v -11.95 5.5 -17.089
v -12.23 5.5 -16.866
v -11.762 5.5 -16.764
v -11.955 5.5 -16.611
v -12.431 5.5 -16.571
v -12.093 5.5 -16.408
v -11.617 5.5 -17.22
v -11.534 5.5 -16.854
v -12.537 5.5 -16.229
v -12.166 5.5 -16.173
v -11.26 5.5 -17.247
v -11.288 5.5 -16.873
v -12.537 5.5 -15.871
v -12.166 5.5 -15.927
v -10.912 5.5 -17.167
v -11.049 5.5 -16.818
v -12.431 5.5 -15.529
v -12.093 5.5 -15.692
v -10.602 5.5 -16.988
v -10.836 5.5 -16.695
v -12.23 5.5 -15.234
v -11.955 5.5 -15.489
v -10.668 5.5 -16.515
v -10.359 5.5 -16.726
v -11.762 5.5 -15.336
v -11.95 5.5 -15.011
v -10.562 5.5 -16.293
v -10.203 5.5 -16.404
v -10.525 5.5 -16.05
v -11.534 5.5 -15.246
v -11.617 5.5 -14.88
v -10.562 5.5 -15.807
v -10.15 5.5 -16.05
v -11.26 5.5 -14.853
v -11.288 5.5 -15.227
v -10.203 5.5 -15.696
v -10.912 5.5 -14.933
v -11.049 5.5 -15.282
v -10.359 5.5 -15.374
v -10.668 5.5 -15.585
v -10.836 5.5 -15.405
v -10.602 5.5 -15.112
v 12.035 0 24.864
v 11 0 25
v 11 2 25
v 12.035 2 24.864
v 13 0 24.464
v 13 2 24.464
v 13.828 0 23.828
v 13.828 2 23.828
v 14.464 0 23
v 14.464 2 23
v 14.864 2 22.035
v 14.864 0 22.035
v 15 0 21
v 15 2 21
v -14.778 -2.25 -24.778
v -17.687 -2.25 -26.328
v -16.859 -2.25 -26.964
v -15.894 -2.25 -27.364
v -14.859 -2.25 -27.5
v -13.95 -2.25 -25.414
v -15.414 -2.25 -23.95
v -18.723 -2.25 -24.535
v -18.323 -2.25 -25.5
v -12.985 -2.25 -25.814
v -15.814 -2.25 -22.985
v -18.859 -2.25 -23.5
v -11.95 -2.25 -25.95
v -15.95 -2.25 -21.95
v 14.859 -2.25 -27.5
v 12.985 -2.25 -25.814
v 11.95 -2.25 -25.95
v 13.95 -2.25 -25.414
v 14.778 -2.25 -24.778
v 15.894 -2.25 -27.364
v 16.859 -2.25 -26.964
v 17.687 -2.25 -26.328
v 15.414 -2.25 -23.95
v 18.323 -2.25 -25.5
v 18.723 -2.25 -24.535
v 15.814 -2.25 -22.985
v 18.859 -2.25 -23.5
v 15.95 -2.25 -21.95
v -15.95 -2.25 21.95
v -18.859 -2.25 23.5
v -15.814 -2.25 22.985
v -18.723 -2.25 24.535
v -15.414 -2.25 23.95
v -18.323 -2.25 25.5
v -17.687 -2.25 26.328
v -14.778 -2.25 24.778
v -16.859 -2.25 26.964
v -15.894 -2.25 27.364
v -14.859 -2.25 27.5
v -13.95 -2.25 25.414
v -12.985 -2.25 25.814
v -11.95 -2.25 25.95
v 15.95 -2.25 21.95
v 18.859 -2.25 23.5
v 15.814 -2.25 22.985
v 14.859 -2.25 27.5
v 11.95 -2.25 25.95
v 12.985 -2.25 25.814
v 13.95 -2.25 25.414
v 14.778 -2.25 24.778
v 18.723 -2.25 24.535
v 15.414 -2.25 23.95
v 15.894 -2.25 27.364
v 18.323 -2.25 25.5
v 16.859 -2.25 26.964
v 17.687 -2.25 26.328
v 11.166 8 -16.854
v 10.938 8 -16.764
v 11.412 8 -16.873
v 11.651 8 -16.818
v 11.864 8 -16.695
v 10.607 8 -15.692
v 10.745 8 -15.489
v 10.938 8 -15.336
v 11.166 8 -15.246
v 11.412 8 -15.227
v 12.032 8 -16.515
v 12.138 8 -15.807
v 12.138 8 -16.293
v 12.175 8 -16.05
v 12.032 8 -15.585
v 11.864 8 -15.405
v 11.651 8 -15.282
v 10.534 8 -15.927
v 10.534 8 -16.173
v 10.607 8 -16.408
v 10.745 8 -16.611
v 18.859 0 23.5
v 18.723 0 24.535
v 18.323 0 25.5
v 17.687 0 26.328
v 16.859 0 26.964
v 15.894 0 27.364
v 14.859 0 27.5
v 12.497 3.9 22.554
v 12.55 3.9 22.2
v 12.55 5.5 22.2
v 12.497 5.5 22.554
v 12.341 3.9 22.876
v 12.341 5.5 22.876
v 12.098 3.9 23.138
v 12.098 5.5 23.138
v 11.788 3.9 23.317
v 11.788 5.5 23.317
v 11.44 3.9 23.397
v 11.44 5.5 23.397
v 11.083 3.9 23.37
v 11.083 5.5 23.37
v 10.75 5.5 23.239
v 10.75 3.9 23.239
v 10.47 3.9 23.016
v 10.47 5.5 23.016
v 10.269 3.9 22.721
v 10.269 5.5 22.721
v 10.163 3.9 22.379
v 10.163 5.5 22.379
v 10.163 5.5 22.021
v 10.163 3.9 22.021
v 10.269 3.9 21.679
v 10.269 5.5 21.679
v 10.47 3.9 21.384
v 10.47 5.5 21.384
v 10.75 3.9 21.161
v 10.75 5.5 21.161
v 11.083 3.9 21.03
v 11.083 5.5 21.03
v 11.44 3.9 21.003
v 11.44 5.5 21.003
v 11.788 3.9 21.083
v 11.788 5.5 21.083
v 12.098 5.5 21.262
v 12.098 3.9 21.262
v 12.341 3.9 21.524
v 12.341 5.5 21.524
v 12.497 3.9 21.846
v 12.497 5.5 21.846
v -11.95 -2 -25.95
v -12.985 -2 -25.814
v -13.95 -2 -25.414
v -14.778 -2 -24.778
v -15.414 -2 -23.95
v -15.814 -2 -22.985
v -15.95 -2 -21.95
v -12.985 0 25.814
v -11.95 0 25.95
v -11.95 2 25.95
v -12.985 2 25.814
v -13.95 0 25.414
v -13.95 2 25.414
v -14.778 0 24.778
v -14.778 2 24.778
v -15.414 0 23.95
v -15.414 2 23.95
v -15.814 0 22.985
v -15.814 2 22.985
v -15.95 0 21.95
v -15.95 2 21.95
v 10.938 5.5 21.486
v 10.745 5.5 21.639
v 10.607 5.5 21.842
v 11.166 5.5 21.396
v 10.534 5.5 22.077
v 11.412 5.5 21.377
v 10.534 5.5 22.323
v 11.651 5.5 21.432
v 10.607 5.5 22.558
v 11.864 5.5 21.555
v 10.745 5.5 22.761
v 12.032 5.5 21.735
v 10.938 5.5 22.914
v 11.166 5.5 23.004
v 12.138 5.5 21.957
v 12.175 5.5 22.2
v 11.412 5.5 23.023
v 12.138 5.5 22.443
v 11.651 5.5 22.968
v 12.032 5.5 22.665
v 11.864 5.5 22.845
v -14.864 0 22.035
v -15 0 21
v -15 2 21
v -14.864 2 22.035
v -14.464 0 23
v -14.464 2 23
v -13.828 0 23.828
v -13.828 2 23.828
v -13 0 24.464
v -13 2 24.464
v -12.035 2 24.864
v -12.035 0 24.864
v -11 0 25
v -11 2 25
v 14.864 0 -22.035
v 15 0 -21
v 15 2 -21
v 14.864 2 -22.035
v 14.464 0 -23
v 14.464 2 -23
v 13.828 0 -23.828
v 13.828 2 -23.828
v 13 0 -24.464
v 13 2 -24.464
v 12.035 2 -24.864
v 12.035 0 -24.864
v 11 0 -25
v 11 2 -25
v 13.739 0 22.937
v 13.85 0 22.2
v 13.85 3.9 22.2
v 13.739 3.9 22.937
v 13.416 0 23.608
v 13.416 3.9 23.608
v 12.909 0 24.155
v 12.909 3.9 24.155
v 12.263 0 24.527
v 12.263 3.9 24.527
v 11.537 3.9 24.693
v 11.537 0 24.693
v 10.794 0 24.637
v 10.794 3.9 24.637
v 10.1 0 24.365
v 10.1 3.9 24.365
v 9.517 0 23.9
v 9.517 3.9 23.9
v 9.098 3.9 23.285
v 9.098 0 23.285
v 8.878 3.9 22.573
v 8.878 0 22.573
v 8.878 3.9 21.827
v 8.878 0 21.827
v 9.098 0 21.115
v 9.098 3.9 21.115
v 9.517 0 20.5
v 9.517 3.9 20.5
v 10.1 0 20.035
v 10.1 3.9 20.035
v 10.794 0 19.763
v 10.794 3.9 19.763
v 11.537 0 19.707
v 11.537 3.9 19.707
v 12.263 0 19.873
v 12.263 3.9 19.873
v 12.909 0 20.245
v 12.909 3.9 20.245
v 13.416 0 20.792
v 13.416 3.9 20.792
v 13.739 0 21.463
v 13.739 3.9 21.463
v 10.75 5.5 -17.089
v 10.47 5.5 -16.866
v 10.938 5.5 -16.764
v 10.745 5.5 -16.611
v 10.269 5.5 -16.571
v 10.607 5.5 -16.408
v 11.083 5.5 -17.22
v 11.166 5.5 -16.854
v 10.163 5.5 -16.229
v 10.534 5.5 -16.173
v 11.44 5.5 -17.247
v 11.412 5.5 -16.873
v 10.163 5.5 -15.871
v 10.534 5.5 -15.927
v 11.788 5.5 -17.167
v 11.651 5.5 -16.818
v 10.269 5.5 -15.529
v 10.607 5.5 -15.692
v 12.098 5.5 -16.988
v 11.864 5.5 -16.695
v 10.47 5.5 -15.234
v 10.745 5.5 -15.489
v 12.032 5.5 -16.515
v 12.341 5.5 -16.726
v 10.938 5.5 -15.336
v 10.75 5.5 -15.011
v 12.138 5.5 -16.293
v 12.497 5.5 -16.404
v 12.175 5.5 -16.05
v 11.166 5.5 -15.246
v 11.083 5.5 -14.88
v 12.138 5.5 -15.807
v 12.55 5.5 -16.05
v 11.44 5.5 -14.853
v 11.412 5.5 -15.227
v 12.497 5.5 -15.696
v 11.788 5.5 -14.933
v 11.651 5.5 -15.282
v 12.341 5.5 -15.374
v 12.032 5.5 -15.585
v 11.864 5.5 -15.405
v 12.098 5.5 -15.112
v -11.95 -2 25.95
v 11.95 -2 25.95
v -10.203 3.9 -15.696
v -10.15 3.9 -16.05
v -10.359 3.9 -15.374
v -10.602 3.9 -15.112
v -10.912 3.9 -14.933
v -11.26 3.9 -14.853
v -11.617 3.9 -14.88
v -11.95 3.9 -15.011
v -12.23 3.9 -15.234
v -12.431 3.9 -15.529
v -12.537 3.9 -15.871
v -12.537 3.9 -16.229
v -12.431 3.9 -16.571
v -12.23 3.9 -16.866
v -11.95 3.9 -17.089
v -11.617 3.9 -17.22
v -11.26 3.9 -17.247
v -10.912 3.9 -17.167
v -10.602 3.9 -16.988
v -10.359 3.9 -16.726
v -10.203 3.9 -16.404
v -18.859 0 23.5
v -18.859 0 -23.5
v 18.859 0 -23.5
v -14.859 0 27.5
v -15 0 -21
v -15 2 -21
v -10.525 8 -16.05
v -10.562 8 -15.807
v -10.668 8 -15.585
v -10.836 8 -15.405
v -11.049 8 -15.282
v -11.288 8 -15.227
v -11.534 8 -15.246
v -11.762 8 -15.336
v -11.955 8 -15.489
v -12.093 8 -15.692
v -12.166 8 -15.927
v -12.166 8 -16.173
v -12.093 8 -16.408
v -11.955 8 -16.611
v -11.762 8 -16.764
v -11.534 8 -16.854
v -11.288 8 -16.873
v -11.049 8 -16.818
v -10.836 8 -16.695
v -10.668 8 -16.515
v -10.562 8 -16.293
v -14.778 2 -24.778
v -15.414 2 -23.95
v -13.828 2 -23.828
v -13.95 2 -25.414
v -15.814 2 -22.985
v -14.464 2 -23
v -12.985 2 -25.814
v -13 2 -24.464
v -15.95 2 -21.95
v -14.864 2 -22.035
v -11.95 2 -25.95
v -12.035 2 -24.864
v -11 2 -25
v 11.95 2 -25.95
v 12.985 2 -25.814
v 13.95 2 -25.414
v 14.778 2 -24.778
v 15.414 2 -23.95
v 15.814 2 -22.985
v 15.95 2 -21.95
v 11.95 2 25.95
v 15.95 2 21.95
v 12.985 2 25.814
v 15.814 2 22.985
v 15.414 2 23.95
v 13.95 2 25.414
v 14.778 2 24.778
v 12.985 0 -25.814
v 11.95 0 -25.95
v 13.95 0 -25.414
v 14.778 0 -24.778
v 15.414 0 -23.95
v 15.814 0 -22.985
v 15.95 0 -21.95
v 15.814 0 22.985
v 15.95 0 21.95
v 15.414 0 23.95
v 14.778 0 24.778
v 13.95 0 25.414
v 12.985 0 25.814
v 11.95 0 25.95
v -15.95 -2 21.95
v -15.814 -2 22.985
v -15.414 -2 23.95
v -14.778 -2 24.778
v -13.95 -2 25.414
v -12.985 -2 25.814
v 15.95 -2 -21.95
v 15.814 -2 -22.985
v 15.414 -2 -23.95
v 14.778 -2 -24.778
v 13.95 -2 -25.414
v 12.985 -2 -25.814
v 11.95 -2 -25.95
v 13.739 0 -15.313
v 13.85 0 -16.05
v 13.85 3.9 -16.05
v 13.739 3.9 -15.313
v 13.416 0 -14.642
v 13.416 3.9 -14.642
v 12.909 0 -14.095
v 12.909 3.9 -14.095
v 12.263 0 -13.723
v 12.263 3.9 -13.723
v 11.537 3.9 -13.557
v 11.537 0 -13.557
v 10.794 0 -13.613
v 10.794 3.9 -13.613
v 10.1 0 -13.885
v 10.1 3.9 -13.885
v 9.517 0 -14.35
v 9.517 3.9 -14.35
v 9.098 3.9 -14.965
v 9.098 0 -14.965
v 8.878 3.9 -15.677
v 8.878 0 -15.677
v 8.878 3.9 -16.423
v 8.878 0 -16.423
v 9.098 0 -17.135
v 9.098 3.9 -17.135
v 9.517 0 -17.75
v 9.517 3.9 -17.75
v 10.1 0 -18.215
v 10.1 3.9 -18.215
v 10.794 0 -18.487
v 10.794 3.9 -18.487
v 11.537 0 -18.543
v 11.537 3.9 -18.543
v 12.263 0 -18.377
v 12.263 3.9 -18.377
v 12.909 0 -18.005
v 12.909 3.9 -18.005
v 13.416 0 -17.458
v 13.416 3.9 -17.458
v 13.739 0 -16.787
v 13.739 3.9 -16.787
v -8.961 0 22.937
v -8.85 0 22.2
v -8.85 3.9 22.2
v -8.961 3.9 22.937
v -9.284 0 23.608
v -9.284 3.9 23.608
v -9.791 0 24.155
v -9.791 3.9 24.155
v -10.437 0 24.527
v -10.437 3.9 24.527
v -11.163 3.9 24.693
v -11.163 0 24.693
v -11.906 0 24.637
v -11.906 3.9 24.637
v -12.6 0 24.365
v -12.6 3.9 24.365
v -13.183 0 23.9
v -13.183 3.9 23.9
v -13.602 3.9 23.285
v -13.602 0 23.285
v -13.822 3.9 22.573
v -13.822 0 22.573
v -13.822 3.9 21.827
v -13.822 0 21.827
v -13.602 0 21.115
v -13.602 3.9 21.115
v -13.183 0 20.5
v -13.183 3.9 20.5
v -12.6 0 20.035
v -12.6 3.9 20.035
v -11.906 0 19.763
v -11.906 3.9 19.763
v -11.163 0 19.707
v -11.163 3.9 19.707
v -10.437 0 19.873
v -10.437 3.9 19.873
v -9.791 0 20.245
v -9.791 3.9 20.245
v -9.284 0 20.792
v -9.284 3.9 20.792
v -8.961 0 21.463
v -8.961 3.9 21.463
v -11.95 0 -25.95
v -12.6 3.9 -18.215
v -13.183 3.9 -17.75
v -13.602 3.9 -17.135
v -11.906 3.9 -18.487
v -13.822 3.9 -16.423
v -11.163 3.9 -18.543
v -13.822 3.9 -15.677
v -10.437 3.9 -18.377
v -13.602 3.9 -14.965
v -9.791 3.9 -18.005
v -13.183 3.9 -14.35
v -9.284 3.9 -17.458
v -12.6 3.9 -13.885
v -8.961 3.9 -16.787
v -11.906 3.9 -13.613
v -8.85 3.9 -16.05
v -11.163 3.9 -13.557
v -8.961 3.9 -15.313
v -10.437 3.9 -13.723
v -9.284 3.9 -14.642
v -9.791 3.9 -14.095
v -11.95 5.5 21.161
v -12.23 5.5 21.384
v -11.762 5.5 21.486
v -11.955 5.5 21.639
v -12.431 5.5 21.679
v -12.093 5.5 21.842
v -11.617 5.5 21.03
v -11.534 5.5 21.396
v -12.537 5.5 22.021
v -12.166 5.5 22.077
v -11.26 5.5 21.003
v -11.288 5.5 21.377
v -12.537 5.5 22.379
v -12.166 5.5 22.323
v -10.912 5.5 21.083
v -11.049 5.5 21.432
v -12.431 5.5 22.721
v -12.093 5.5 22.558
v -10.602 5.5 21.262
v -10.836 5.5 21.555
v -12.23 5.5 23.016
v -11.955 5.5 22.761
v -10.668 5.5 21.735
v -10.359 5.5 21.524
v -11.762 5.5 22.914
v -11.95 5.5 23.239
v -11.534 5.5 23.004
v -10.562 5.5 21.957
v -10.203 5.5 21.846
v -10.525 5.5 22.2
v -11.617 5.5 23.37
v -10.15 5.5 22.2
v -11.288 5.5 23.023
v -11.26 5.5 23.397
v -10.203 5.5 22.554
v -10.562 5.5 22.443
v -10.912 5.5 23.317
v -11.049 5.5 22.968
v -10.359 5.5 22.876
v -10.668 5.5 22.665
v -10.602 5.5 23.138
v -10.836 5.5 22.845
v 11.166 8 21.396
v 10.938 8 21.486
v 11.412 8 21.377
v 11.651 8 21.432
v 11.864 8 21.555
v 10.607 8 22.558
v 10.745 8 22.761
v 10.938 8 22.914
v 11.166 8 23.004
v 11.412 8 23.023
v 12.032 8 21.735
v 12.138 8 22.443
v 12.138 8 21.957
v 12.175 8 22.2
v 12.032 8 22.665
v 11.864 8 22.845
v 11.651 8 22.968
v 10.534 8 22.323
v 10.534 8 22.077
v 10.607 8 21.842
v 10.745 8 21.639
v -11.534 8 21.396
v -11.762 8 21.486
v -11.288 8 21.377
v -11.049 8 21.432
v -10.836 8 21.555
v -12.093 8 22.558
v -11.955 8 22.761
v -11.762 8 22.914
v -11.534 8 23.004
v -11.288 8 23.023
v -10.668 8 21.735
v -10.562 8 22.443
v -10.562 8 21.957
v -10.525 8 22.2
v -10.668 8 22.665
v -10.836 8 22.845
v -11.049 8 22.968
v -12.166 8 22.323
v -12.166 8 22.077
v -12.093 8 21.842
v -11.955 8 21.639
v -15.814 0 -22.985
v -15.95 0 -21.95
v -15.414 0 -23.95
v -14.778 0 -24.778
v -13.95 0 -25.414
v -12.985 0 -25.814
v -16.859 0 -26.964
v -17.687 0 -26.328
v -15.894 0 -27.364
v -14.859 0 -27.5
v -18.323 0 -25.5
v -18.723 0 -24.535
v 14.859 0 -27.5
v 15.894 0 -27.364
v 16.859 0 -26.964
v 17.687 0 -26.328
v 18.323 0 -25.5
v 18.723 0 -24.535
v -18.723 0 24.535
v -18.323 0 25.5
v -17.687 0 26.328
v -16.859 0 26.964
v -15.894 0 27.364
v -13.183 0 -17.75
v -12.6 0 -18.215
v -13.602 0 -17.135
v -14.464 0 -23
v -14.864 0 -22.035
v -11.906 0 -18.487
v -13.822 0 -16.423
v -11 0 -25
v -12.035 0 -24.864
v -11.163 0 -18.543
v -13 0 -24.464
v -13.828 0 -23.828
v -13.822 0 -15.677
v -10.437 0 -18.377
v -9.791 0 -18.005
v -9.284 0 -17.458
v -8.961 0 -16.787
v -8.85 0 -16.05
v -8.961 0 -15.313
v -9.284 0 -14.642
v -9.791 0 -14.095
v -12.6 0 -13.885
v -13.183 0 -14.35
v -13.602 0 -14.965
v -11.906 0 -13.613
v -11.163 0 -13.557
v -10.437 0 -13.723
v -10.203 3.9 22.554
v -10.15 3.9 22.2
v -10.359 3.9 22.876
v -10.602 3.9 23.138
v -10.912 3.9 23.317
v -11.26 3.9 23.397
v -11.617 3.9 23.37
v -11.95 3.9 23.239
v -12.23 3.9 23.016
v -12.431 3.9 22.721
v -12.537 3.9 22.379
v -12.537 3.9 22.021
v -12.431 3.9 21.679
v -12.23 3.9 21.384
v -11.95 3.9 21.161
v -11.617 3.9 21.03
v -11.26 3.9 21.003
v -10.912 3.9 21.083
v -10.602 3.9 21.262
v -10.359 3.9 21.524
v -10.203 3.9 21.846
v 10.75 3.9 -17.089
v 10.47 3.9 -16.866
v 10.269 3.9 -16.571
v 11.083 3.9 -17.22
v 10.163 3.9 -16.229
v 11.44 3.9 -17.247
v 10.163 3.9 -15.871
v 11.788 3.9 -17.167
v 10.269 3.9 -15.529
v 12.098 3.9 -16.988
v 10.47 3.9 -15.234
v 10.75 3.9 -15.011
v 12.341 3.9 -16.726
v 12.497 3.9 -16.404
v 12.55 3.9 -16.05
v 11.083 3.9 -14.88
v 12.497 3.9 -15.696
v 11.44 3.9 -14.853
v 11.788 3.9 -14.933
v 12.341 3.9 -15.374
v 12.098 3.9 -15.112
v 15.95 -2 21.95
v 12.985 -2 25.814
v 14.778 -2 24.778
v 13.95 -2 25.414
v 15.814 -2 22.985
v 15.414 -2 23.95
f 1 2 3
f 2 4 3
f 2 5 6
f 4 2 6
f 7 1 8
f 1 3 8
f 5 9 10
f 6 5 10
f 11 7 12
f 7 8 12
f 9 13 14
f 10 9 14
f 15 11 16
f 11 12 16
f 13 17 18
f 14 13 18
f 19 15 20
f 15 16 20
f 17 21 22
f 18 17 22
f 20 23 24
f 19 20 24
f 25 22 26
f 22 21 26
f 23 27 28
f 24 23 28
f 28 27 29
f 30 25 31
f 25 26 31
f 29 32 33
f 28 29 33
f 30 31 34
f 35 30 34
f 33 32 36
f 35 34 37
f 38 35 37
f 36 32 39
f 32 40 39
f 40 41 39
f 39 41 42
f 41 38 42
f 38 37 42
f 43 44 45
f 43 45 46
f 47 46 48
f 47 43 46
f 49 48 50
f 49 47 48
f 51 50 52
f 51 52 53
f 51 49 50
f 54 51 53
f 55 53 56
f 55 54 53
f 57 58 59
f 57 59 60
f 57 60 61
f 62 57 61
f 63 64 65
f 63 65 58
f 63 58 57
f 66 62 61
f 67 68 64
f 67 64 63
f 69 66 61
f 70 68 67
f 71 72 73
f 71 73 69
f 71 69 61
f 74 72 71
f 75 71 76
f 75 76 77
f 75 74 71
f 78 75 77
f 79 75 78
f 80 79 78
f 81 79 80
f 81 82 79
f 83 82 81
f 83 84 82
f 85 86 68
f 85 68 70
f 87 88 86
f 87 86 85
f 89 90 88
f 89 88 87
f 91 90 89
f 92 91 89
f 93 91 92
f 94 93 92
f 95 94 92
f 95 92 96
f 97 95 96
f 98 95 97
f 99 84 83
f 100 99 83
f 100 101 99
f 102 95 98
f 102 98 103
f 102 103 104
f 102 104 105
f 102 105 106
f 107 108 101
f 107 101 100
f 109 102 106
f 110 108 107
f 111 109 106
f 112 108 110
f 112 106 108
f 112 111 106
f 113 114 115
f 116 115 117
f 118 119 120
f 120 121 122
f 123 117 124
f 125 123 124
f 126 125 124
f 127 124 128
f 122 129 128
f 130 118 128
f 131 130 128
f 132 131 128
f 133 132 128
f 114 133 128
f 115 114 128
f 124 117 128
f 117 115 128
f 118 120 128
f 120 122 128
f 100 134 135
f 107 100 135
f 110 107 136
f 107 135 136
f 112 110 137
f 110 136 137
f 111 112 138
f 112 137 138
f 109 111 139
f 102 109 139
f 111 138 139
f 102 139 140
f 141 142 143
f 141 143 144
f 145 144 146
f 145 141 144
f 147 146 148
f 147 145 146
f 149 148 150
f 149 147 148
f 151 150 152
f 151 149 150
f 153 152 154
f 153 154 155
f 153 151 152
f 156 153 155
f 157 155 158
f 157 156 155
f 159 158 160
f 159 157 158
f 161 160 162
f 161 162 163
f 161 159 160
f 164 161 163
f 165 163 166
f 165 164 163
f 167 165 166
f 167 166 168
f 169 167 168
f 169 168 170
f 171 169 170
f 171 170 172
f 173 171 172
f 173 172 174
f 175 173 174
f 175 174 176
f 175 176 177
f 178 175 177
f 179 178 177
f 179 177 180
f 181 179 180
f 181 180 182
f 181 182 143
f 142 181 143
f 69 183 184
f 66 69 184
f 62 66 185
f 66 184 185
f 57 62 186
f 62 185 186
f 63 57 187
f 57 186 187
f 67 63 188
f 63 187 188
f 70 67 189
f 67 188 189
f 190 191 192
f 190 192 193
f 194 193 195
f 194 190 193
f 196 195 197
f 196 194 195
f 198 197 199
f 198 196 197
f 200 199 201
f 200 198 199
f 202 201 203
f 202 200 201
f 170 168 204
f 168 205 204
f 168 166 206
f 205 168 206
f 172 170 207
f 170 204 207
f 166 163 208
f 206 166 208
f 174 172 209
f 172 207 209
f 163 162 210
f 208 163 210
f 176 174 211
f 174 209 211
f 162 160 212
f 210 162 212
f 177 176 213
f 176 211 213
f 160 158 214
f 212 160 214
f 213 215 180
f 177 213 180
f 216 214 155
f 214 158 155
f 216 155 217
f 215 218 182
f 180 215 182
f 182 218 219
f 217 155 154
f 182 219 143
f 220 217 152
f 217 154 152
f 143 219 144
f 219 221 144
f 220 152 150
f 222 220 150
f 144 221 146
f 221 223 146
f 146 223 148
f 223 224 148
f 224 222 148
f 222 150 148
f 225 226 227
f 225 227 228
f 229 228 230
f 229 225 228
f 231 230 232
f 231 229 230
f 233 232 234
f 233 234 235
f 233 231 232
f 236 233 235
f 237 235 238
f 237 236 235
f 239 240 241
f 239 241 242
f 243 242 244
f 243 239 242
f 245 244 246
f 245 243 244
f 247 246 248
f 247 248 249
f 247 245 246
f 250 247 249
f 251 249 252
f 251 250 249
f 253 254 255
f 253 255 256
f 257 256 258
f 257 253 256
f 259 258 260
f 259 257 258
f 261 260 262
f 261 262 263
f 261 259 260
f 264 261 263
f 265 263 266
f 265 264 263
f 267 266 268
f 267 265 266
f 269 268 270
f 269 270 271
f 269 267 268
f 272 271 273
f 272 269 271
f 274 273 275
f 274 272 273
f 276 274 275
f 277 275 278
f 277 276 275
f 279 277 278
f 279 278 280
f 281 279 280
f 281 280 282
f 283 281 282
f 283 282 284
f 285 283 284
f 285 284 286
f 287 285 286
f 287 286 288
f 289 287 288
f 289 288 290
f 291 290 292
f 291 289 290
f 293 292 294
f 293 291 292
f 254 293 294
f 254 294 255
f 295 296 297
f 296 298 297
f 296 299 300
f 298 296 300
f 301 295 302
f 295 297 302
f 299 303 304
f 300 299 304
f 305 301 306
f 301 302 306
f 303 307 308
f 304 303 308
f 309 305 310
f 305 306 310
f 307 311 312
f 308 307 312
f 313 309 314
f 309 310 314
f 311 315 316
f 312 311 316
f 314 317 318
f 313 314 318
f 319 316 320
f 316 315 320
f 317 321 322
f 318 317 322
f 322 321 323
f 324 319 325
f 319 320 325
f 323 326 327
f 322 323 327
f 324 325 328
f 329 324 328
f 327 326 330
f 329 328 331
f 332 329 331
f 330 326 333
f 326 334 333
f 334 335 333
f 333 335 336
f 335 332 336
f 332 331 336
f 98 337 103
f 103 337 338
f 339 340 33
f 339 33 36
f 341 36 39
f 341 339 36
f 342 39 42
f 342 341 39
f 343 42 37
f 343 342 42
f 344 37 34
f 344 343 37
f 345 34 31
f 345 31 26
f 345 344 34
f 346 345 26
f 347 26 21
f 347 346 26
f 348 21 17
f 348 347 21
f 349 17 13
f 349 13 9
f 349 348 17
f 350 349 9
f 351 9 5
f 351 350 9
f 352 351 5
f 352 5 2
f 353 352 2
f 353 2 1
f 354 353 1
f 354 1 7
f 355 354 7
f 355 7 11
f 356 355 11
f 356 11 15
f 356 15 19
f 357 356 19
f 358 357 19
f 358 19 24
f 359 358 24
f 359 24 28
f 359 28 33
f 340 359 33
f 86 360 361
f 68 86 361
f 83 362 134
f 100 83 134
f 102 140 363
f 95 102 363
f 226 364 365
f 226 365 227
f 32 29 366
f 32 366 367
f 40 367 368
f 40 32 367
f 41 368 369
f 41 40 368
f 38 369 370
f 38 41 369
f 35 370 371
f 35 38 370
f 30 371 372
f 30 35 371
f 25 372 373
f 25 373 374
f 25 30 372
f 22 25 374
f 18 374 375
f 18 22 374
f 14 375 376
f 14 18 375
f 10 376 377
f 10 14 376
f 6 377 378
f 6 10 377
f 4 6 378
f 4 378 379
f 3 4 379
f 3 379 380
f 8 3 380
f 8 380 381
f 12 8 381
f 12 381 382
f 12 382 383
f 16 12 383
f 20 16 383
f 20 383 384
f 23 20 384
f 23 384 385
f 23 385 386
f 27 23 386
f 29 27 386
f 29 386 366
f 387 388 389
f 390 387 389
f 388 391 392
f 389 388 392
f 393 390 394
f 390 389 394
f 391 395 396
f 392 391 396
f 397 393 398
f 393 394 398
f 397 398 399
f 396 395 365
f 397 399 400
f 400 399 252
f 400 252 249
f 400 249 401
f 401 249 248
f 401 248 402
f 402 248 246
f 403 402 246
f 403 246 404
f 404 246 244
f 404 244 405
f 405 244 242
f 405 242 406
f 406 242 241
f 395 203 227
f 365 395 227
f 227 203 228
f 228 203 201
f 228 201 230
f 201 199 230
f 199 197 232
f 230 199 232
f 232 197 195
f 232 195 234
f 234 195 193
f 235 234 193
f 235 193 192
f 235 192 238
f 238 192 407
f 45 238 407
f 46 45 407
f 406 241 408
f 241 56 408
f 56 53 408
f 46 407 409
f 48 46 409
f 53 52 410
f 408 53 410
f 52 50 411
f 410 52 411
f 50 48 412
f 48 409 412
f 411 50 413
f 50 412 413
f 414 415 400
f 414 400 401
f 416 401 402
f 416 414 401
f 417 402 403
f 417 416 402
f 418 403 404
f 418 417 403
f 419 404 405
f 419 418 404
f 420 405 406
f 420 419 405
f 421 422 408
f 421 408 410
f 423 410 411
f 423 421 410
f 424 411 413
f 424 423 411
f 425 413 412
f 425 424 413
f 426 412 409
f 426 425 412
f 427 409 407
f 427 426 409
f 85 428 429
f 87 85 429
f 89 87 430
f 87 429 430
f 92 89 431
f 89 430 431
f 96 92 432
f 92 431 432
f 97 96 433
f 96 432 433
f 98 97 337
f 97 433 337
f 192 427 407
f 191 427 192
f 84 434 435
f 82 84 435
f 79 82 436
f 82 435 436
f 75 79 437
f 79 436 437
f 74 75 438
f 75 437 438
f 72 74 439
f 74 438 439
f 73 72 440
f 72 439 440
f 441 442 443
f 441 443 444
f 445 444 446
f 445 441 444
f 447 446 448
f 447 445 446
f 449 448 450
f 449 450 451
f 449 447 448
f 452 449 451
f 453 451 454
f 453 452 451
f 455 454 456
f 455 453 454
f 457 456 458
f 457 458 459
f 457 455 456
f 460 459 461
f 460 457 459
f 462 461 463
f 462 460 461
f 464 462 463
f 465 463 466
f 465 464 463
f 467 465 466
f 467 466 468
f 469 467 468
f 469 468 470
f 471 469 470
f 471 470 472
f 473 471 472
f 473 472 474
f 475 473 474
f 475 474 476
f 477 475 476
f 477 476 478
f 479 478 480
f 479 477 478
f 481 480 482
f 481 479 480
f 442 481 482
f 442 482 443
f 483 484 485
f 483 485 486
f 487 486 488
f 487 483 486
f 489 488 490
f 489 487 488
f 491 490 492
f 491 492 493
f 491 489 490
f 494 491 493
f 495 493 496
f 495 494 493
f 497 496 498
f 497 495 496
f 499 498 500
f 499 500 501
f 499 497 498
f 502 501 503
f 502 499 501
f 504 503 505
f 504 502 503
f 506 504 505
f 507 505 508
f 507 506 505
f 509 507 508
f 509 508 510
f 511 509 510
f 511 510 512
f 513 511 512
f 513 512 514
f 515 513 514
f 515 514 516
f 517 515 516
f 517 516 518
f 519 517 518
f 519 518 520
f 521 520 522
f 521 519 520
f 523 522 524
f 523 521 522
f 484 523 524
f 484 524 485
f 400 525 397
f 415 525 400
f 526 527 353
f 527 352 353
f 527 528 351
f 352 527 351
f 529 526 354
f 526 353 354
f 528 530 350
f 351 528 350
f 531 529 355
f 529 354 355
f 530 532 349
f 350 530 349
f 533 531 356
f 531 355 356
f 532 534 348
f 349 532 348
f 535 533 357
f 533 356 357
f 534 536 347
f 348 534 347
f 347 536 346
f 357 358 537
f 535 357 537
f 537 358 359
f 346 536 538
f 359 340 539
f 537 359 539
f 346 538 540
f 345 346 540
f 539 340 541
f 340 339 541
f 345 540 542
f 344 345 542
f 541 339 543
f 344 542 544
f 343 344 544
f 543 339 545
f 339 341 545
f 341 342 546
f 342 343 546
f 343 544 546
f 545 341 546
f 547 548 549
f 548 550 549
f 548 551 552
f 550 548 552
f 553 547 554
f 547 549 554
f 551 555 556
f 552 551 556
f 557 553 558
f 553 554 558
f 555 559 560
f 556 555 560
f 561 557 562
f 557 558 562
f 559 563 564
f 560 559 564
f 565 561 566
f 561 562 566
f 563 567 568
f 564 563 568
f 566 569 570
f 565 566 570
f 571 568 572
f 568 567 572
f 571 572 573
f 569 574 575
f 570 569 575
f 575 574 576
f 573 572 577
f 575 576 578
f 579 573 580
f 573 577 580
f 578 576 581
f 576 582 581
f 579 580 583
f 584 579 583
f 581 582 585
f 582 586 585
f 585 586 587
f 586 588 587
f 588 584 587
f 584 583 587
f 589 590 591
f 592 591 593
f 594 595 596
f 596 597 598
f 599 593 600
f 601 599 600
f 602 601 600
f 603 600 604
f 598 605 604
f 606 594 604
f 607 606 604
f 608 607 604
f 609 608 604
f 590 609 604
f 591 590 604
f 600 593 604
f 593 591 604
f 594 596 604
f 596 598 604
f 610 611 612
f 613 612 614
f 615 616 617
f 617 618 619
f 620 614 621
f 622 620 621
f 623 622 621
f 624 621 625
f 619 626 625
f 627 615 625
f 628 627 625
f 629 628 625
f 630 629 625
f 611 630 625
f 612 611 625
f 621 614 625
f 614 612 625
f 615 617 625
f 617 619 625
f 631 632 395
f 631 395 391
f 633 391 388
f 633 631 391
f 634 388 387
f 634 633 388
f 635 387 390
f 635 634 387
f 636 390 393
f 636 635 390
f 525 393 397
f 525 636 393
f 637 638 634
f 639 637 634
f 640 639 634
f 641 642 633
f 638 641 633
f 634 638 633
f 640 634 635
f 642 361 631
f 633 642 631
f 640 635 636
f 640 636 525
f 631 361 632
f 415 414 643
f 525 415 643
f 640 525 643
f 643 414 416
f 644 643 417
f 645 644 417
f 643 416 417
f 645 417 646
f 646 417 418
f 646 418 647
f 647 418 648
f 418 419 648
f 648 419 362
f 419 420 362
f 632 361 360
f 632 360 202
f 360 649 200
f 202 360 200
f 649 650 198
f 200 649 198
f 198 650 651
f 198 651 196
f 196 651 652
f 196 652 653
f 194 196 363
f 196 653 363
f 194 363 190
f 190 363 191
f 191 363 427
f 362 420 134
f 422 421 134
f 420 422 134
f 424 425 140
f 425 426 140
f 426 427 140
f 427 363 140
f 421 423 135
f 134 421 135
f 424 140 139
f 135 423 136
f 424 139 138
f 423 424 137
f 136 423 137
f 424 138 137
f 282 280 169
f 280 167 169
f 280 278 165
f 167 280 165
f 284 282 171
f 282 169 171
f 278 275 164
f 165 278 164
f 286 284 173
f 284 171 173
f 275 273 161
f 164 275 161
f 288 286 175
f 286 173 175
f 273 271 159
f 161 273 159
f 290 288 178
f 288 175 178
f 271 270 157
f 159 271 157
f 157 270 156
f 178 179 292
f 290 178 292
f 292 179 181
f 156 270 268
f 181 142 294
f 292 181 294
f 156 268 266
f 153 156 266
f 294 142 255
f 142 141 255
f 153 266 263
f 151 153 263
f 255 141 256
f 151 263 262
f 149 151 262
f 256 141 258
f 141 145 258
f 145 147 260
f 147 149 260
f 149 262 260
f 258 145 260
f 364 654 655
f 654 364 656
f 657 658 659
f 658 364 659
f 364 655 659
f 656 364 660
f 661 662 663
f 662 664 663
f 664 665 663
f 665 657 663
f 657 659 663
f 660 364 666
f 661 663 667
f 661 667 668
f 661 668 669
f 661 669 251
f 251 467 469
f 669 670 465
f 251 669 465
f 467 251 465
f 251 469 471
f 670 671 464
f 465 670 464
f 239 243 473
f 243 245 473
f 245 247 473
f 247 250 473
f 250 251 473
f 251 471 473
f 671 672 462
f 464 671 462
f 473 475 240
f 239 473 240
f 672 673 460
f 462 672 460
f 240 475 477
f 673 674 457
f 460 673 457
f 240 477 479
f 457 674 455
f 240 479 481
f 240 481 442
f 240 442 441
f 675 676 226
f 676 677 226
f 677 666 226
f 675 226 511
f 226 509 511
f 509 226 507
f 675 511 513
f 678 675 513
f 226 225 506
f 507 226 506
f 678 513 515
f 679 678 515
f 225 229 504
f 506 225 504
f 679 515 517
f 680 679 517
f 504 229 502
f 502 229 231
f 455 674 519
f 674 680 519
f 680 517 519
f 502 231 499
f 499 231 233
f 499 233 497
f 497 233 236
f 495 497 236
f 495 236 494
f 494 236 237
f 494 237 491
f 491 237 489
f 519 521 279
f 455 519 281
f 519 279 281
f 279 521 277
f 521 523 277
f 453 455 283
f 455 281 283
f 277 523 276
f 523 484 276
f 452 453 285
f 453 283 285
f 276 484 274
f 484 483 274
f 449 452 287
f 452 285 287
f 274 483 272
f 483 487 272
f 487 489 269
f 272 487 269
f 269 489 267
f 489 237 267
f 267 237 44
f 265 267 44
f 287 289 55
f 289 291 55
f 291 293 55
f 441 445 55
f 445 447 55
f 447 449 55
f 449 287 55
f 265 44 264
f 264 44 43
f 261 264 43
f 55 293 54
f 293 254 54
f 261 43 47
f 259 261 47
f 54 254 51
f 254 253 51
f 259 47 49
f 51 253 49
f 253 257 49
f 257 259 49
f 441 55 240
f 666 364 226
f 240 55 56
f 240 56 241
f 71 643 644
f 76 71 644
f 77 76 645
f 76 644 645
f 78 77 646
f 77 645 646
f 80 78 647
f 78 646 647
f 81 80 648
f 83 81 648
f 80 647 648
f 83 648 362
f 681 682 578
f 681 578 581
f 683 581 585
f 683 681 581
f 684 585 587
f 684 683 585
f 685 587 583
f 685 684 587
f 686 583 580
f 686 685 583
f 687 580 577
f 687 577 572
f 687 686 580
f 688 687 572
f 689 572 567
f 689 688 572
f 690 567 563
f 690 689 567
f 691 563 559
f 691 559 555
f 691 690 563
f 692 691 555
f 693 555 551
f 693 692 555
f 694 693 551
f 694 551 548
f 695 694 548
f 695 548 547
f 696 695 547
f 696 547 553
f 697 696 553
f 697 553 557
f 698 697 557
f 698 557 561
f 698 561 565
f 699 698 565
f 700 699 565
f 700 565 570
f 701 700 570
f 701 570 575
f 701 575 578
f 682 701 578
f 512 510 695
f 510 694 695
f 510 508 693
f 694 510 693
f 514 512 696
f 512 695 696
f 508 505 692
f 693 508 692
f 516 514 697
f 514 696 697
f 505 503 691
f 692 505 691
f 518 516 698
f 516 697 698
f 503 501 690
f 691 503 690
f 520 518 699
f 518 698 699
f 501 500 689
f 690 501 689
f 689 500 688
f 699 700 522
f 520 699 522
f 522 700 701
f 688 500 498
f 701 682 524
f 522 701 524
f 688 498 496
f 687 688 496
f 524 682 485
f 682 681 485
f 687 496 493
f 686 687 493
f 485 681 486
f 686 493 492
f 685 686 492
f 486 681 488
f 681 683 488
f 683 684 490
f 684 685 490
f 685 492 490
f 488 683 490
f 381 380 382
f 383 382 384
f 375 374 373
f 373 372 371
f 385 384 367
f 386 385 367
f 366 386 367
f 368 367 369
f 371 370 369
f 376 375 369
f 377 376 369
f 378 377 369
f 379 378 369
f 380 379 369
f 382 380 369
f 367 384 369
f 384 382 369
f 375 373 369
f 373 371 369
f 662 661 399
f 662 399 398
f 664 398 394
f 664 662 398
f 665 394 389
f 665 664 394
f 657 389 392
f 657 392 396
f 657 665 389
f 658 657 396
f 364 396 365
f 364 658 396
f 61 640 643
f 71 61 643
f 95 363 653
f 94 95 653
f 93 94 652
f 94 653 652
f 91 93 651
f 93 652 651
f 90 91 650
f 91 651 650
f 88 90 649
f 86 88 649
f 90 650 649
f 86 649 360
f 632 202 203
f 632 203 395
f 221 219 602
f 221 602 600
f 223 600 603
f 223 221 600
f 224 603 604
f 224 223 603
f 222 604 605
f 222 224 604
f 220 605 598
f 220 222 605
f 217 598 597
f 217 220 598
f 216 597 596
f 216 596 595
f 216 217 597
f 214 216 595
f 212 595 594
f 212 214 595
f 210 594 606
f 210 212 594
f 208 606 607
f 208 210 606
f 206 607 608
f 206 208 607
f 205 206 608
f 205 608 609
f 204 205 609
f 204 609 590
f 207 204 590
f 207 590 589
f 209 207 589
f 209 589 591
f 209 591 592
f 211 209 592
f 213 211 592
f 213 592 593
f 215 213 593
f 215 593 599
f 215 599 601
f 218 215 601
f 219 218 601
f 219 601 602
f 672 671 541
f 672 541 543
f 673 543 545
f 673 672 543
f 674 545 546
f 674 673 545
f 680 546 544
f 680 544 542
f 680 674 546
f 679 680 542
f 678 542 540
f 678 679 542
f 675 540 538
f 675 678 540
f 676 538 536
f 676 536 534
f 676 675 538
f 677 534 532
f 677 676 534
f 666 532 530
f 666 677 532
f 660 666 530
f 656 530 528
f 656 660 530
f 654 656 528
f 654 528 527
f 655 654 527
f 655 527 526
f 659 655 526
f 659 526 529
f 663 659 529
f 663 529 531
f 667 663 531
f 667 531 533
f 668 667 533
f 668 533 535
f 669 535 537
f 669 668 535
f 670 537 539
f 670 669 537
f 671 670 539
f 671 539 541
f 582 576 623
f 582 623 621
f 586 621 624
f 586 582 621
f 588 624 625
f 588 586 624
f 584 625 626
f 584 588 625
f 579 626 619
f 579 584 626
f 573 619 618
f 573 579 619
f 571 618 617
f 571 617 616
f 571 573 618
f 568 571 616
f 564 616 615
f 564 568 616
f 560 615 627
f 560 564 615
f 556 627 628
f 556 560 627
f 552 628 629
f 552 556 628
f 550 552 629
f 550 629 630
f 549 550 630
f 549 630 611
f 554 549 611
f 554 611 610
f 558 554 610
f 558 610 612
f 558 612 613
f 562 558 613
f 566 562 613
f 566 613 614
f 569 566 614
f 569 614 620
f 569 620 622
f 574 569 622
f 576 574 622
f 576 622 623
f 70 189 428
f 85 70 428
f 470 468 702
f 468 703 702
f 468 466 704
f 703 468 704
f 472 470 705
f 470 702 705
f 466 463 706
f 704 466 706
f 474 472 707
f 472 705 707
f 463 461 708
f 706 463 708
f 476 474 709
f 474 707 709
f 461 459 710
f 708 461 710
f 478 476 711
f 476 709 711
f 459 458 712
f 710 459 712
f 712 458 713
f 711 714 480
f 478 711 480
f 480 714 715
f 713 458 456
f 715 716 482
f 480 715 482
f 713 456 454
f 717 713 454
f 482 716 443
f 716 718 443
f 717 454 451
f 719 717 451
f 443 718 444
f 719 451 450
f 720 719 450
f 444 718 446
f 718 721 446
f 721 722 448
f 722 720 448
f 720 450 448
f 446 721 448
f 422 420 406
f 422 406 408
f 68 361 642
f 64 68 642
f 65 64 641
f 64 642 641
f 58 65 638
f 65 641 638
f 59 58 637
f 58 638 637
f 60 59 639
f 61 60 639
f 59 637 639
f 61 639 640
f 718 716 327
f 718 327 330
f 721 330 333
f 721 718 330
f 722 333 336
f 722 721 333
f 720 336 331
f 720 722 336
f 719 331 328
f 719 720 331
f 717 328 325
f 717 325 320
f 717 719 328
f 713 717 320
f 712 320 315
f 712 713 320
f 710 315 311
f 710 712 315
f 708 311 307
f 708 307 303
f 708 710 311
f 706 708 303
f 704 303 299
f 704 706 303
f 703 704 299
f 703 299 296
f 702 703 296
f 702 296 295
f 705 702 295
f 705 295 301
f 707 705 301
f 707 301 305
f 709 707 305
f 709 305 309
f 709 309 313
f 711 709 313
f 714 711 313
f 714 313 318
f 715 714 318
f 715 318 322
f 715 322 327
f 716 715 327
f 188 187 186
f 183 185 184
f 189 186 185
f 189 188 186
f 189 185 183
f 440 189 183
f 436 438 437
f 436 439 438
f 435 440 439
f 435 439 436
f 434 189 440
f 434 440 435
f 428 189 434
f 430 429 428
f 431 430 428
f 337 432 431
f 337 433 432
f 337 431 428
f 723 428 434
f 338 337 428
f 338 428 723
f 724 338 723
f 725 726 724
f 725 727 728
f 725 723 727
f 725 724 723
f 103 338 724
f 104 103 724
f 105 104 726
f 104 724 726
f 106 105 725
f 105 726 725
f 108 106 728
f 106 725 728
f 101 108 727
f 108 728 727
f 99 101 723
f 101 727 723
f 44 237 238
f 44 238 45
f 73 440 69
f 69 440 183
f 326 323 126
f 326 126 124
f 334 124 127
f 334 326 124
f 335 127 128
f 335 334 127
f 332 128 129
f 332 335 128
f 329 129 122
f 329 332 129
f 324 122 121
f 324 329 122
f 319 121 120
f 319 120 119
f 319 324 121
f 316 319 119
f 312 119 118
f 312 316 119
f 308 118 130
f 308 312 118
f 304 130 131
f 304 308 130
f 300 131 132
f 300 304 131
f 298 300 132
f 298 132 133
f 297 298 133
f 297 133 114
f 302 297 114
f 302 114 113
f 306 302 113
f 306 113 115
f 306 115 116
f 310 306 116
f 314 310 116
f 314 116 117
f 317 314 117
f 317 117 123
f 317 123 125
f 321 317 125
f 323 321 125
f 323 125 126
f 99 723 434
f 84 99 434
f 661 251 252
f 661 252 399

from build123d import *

# Parameters (mm, degrees)
F0_R     = 2.5
F0_W     = 0.95
F0_H     = 30
F0_R_2   = 1.2
F0_R_3   = 0.825
F1_DEPTH = 2
F2_DEPTH = 2
F3_DEPTH = 2.25
F4_DEPTH = 8
F5_DEPTH = 5.5
F6_DEPTH = 3.9


# Not quite as in the source:
# - a feature names something its author has since deleted; it is built from what else it names


with BuildPart() as f1:
    # F0 (on Front) → F1 (new body)
    with BuildSketch(Plane.XZ):
        with BuildLine():
            Line((0, 25), (0, -25))
            Line((0, -25), (11, -25))
            ThreePointArc((11, -25), (13.8284271247, -23.8284271247), (15, -21))
            Line((15, -21), (15, -15))
            Line((15, -15), (15, 15))
            Line((15, 15), (15, 21))
            ThreePointArc((15, 21), (13.8284271247, 23.8284271247), (11, 25))
            Line((11, 25), (0, 25))
        make_face()
        with Locations((11.35, -16.05)):
            Circle(F0_R, mode=Mode.SUBTRACT)
        with Locations((11.35, 22.2)):
            Circle(F0_R, mode=Mode.SUBTRACT)
        with BuildLine():
            Line((-11, -25), (0, -25))
            Line((0, -25), (0, 25))
            Line((0, 25), (-11, 25))
            ThreePointArc((-11, 25), (-13.8284271247, 23.8284271247), (-15, 21))
            Line((-15, 21), (-15, 15))
            Line((-15, 15), (-15, -15))
            Line((-15, -15), (-15, -21))
            ThreePointArc((-15, -21), (-13.8284271247, -23.8284271247), (-11, -25))
        make_face()
        with Locations((-11.35, -16.05)):
            Circle(F0_R, mode=Mode.SUBTRACT)
        with Locations((-11.35, 22.2)):
            Circle(F0_R, mode=Mode.SUBTRACT)
        with BuildLine():
            Line((0, -27.5), (0, -25.95))
            Line((0, -25.95), (-11.95, -25.95))
            ThreePointArc((-11.95, -25.95), (-14.7784271247, -24.7784271247), (-15.95, -21.95))
            Line((-15.95, -21.95), (-15.95, -15))
            Line((-15.95, -15), (-15.95, 15))
            Line((-15.95, 15), (-15.95, 21.95))
            ThreePointArc((-15.95, 21.95), (-14.7784271247, 24.7784271247), (-11.95, 25.95))
            Line((-11.95, 25.95), (0, 25.95))
            Line((0, 25.95), (0, 27.5))
            Line((0, 27.5), (-14.8588332385, 27.5))
            ThreePointArc((-14.8588332385, 27.5), (-17.6872603632, 26.3284271247), (-18.8588332385, 23.5))
            Line((-18.8588332385, 23.5), (-18.8588332385, -23.5))
            ThreePointArc((-18.8588332385, -23.5), (-17.6872603632, -26.3284271247), (-14.8588332385, -27.5))
            Line((-14.8588332385, -27.5), (0, -27.5))
        make_face()
        with BuildLine():
            ThreePointArc((15.95, -21.95), (14.7784271247, -24.7784271247), (11.95, -25.95))
            Line((11.95, -25.95), (0, -25.95))
            Line((0, -25.95), (0, -27.5))
            Line((0, -27.5), (14.8588332385, -27.5))
            ThreePointArc((14.8588332385, -27.5), (17.6872603632, -26.3284271247), (18.8588332385, -23.5))
            Line((18.8588332385, -23.5), (18.8588332385, 23.5))
            ThreePointArc((18.8588332385, 23.5), (17.6872603632, 26.3284271247), (14.8588332385, 27.5))
            Line((14.8588332385, 27.5), (0, 27.5))
            Line((0, 27.5), (0, 25.95))
            Line((0, 25.95), (11.95, 25.95))
            ThreePointArc((11.95, 25.95), (14.7784271247, 24.7784271247), (15.95, 21.95))
            Line((15.95, 21.95), (15.95, 15))
            Line((15.95, 15), (15.95, -15))
            Line((15.95, -15), (15.95, -21.95))
        make_face()
        with Locations((15.475, 0)):
            Rectangle(F0_W, F0_H)
        with Locations((-15.475, 0)):
            Rectangle(F0_W, F0_H)
        with BuildLine():
            Line((-11, 25), (0, 25))
            Line((0, 25), (0, 25.95))
            Line((0, 25.95), (-11.95, 25.95))
            ThreePointArc((-11.95, 25.95), (-14.7784271247, 24.7784271247), (-15.95, 21.95))
            Line((-15.95, 21.95), (-15.95, 15))
            Line((-15.95, 15), (-15, 15))
            Line((-15, 15), (-15, 21))
            ThreePointArc((-15, 21), (-13.8284271247, 23.8284271247), (-11, 25))
        make_face()
        with BuildLine():
            Line((0, 25.95), (0, 25))
            Line((0, 25), (11, 25))
            ThreePointArc((11, 25), (13.8284271247, 23.8284271247), (15, 21))
            Line((15, 21), (15, 15))
            Line((15, 15), (15.95, 15))
            Line((15.95, 15), (15.95, 21.95))
            ThreePointArc((15.95, 21.95), (14.7784271247, 24.7784271247), (11.95, 25.95))
            Line((11.95, 25.95), (0, 25.95))
        make_face()
        with BuildLine():
            Line((0, -25.95), (11.95, -25.95))
            ThreePointArc((11.95, -25.95), (14.7784271247, -24.7784271247), (15.95, -21.95))
            Line((15.95, -21.95), (15.95, -15))
            Line((15.95, -15), (15, -15))
            Line((15, -15), (15, -21))
            ThreePointArc((15, -21), (13.8284271247, -23.8284271247), (11, -25))
            Line((11, -25), (0, -25))
            Line((0, -25), (0, -25.95))
        make_face()
        with BuildLine():
            Line((-11.95, -25.95), (0, -25.95))
            Line((0, -25.95), (0, -25))
            Line((0, -25), (-11, -25))
            ThreePointArc((-11, -25), (-13.8284271247, -23.8284271247), (-15, -21))
            Line((-15, -21), (-15, -15))
            Line((-15, -15), (-15.95, -15))
            Line((-15.95, -15), (-15.95, -21.95))
            ThreePointArc((-15.95, -21.95), (-14.7784271247, -24.7784271247), (-11.95, -25.95))
        make_face()
        with Locations((11.35, -16.05)):
            Circle(F0_R)
        with Locations((11.35, -16.05)):
            Circle(F0_R_2, mode=Mode.SUBTRACT)
        with Locations((-11.35, -16.05)):
            Circle(F0_R)
        with Locations((-11.35, -16.05)):
            Circle(F0_R_2, mode=Mode.SUBTRACT)
        with Locations((11.35, 22.2)):
            Circle(F0_R)
        with Locations((11.35, 22.2)):
            Circle(F0_R_2, mode=Mode.SUBTRACT)
        with Locations((-11.35, 22.2)):
            Circle(F0_R)
        with Locations((-11.35, 22.2)):
            Circle(F0_R_2, mode=Mode.SUBTRACT)
        with Locations((-11.35, -16.05)):
            Circle(F0_R_2)
        with Locations((-11.35, -16.05)):
            Circle(F0_R_3, mode=Mode.SUBTRACT)
        with Locations((11.35, 22.2)):
            Circle(F0_R_2)
        with Locations((11.35, 22.2)):
            Circle(F0_R_3, mode=Mode.SUBTRACT)
        with Locations((-11.35, 22.2)):
            Circle(F0_R_2)
        with Locations((-11.35, 22.2)):
            Circle(F0_R_3, mode=Mode.SUBTRACT)
        with Locations((11.35, -16.05)):
            Circle(F0_R_2)
        with Locations((11.35, -16.05)):
            Circle(F0_R_3, mode=Mode.SUBTRACT)
        with Locations((-11.35, -16.05)):
            Circle(F0_R_3)
        with Locations((11.35, -16.05)):
            Circle(F0_R_3)
        with Locations((11.35, 22.2)):
            Circle(F0_R_3)
        with Locations((-11.35, 22.2)):
            Circle(F0_R_3)
    extrude(amount=F1_DEPTH)

    # F0 (on Front) → F2 (join)
    with BuildSketch(Plane.XZ):
        with BuildLine():
            Line((0, -25.95), (11.95, -25.95))
            ThreePointArc((11.95, -25.95), (14.7784271247, -24.7784271247), (15.95, -21.95))
            Line((15.95, -21.95), (15.95, -15))
            Line((15.95, -15), (15, -15))
            Line((15, -15), (15, -21))
            ThreePointArc((15, -21), (13.8284271247, -23.8284271247), (11, -25))
            Line((11, -25), (0, -25))
            Line((0, -25), (0, -25.95))
        make_face()
        with Locations((15.475, 0)):
            Rectangle(F0_W, F0_H)
        with BuildLine():
            Line((0, 25.95), (0, 25))
            Line((0, 25), (11, 25))
            ThreePointArc((11, 25), (13.8284271247, 23.8284271247), (15, 21))
            Line((15, 21), (15, 15))
            Line((15, 15), (15.95, 15))
            Line((15.95, 15), (15.95, 21.95))
            ThreePointArc((15.95, 21.95), (14.7784271247, 24.7784271247), (11.95, 25.95))
            Line((11.95, 25.95), (0, 25.95))
        make_face()
        with BuildLine():
            Line((-11.95, -25.95), (0, -25.95))
            Line((0, -25.95), (0, -25))
            Line((0, -25), (-11, -25))
            ThreePointArc((-11, -25), (-13.8284271247, -23.8284271247), (-15, -21))
            Line((-15, -21), (-15, -15))
            Line((-15, -15), (-15.95, -15))
            Line((-15.95, -15), (-15.95, -21.95))
            ThreePointArc((-15.95, -21.95), (-14.7784271247, -24.7784271247), (-11.95, -25.95))
        make_face()
        with Locations((-15.475, 0)):
            Rectangle(F0_W, F0_H)
        with BuildLine():
            Line((-11, 25), (0, 25))
            Line((0, 25), (0, 25.95))
            Line((0, 25.95), (-11.95, 25.95))
            ThreePointArc((-11.95, 25.95), (-14.7784271247, 24.7784271247), (-15.95, 21.95))
            Line((-15.95, 21.95), (-15.95, 15))
            Line((-15.95, 15), (-15, 15))
            Line((-15, 15), (-15, 21))
            ThreePointArc((-15, 21), (-13.8284271247, 23.8284271247), (-11, 25))
        make_face()
    extrude(amount=-F2_DEPTH)

    # F0 (on Front) → F3 (join)
    with BuildSketch(Plane.XZ):
        with BuildLine():
            ThreePointArc((15.95, -21.95), (14.7784271247, -24.7784271247), (11.95, -25.95))
            Line((11.95, -25.95), (0, -25.95))
            Line((0, -25.95), (0, -27.5))
            Line((0, -27.5), (14.8588332385, -27.5))
            ThreePointArc((14.8588332385, -27.5), (17.6872603632, -26.3284271247), (18.8588332385, -23.5))
            Line((18.8588332385, -23.5), (18.8588332385, 23.5))
            ThreePointArc((18.8588332385, 23.5), (17.6872603632, 26.3284271247), (14.8588332385, 27.5))
            Line((14.8588332385, 27.5), (0, 27.5))
            Line((0, 27.5), (0, 25.95))
            Line((0, 25.95), (11.95, 25.95))
            ThreePointArc((11.95, 25.95), (14.7784271247, 24.7784271247), (15.95, 21.95))
            Line((15.95, 21.95), (15.95, 15))
            Line((15.95, 15), (15.95, -15))
            Line((15.95, -15), (15.95, -21.95))
        make_face()
        with BuildLine():
            Line((0, -27.5), (0, -25.95))
            Line((0, -25.95), (-11.95, -25.95))
            ThreePointArc((-11.95, -25.95), (-14.7784271247, -24.7784271247), (-15.95, -21.95))
            Line((-15.95, -21.95), (-15.95, -15))
            Line((-15.95, -15), (-15.95, 15))
            Line((-15.95, 15), (-15.95, 21.95))
            ThreePointArc((-15.95, 21.95), (-14.7784271247, 24.7784271247), (-11.95, 25.95))
            Line((-11.95, 25.95), (0, 25.95))
            Line((0, 25.95), (0, 27.5))
            Line((0, 27.5), (-14.8588332385, 27.5))
            ThreePointArc((-14.8588332385, 27.5), (-17.6872603632, 26.3284271247), (-18.8588332385, 23.5))
            Line((-18.8588332385, 23.5), (-18.8588332385, -23.5))
            ThreePointArc((-18.8588332385, -23.5), (-17.6872603632, -26.3284271247), (-14.8588332385, -27.5))
            Line((-14.8588332385, -27.5), (0, -27.5))
        make_face()
    extrude(amount=F3_DEPTH)

    # F0 (on Front) → F4 (join)
    with BuildSketch(Plane.XZ):
        with Locations((11.35, -16.05)):
            Circle(F0_R_3)
        with Locations((-11.35, -16.05)):
            Circle(F0_R_3)
        with Locations((-11.35, 22.2)):
            Circle(F0_R_3)
        with Locations((11.35, 22.2)):
            Circle(F0_R_3)
    extrude(amount=-F4_DEPTH)

    # F0 (on Front) → F5 (join)
    with BuildSketch(Plane.XZ):
        with Locations((11.35, -16.05)):
            Circle(F0_R_2)
        with Locations((11.35, -16.05)):
            Circle(F0_R_3, mode=Mode.SUBTRACT)
        with Locations((-11.35, -16.05)):
            Circle(F0_R_2)
        with Locations((-11.35, -16.05)):
            Circle(F0_R_3, mode=Mode.SUBTRACT)
        with Locations((-11.35, 22.2)):
            Circle(F0_R_2)
        with Locations((-11.35, 22.2)):
            Circle(F0_R_3, mode=Mode.SUBTRACT)
        with Locations((11.35, 22.2)):
            Circle(F0_R_2)
        with Locations((11.35, 22.2)):
            Circle(F0_R_3, mode=Mode.SUBTRACT)
    extrude(amount=-F5_DEPTH)

    # F0 (on Front) → F6 (join)
    with BuildSketch(Plane.XZ):
        with Locations((11.35, 22.2)):
            Circle(F0_R)
        with Locations((11.35, 22.2)):
            Circle(F0_R_2, mode=Mode.SUBTRACT)
        with Locations((-11.35, 22.2)):
            Circle(F0_R)
        with Locations((-11.35, 22.2)):
            Circle(F0_R_2, mode=Mode.SUBTRACT)
        with Locations((11.35, -16.05)):
            Circle(F0_R)
        with Locations((11.35, -16.05)):
            Circle(F0_R_2, mode=Mode.SUBTRACT)
        with Locations((-11.35, -16.05)):
            Circle(F0_R)
        with Locations((-11.35, -16.05)):
            Circle(F0_R_2, mode=Mode.SUBTRACT)
    extrude(amount=-F6_DEPTH)


solid = f1.part
